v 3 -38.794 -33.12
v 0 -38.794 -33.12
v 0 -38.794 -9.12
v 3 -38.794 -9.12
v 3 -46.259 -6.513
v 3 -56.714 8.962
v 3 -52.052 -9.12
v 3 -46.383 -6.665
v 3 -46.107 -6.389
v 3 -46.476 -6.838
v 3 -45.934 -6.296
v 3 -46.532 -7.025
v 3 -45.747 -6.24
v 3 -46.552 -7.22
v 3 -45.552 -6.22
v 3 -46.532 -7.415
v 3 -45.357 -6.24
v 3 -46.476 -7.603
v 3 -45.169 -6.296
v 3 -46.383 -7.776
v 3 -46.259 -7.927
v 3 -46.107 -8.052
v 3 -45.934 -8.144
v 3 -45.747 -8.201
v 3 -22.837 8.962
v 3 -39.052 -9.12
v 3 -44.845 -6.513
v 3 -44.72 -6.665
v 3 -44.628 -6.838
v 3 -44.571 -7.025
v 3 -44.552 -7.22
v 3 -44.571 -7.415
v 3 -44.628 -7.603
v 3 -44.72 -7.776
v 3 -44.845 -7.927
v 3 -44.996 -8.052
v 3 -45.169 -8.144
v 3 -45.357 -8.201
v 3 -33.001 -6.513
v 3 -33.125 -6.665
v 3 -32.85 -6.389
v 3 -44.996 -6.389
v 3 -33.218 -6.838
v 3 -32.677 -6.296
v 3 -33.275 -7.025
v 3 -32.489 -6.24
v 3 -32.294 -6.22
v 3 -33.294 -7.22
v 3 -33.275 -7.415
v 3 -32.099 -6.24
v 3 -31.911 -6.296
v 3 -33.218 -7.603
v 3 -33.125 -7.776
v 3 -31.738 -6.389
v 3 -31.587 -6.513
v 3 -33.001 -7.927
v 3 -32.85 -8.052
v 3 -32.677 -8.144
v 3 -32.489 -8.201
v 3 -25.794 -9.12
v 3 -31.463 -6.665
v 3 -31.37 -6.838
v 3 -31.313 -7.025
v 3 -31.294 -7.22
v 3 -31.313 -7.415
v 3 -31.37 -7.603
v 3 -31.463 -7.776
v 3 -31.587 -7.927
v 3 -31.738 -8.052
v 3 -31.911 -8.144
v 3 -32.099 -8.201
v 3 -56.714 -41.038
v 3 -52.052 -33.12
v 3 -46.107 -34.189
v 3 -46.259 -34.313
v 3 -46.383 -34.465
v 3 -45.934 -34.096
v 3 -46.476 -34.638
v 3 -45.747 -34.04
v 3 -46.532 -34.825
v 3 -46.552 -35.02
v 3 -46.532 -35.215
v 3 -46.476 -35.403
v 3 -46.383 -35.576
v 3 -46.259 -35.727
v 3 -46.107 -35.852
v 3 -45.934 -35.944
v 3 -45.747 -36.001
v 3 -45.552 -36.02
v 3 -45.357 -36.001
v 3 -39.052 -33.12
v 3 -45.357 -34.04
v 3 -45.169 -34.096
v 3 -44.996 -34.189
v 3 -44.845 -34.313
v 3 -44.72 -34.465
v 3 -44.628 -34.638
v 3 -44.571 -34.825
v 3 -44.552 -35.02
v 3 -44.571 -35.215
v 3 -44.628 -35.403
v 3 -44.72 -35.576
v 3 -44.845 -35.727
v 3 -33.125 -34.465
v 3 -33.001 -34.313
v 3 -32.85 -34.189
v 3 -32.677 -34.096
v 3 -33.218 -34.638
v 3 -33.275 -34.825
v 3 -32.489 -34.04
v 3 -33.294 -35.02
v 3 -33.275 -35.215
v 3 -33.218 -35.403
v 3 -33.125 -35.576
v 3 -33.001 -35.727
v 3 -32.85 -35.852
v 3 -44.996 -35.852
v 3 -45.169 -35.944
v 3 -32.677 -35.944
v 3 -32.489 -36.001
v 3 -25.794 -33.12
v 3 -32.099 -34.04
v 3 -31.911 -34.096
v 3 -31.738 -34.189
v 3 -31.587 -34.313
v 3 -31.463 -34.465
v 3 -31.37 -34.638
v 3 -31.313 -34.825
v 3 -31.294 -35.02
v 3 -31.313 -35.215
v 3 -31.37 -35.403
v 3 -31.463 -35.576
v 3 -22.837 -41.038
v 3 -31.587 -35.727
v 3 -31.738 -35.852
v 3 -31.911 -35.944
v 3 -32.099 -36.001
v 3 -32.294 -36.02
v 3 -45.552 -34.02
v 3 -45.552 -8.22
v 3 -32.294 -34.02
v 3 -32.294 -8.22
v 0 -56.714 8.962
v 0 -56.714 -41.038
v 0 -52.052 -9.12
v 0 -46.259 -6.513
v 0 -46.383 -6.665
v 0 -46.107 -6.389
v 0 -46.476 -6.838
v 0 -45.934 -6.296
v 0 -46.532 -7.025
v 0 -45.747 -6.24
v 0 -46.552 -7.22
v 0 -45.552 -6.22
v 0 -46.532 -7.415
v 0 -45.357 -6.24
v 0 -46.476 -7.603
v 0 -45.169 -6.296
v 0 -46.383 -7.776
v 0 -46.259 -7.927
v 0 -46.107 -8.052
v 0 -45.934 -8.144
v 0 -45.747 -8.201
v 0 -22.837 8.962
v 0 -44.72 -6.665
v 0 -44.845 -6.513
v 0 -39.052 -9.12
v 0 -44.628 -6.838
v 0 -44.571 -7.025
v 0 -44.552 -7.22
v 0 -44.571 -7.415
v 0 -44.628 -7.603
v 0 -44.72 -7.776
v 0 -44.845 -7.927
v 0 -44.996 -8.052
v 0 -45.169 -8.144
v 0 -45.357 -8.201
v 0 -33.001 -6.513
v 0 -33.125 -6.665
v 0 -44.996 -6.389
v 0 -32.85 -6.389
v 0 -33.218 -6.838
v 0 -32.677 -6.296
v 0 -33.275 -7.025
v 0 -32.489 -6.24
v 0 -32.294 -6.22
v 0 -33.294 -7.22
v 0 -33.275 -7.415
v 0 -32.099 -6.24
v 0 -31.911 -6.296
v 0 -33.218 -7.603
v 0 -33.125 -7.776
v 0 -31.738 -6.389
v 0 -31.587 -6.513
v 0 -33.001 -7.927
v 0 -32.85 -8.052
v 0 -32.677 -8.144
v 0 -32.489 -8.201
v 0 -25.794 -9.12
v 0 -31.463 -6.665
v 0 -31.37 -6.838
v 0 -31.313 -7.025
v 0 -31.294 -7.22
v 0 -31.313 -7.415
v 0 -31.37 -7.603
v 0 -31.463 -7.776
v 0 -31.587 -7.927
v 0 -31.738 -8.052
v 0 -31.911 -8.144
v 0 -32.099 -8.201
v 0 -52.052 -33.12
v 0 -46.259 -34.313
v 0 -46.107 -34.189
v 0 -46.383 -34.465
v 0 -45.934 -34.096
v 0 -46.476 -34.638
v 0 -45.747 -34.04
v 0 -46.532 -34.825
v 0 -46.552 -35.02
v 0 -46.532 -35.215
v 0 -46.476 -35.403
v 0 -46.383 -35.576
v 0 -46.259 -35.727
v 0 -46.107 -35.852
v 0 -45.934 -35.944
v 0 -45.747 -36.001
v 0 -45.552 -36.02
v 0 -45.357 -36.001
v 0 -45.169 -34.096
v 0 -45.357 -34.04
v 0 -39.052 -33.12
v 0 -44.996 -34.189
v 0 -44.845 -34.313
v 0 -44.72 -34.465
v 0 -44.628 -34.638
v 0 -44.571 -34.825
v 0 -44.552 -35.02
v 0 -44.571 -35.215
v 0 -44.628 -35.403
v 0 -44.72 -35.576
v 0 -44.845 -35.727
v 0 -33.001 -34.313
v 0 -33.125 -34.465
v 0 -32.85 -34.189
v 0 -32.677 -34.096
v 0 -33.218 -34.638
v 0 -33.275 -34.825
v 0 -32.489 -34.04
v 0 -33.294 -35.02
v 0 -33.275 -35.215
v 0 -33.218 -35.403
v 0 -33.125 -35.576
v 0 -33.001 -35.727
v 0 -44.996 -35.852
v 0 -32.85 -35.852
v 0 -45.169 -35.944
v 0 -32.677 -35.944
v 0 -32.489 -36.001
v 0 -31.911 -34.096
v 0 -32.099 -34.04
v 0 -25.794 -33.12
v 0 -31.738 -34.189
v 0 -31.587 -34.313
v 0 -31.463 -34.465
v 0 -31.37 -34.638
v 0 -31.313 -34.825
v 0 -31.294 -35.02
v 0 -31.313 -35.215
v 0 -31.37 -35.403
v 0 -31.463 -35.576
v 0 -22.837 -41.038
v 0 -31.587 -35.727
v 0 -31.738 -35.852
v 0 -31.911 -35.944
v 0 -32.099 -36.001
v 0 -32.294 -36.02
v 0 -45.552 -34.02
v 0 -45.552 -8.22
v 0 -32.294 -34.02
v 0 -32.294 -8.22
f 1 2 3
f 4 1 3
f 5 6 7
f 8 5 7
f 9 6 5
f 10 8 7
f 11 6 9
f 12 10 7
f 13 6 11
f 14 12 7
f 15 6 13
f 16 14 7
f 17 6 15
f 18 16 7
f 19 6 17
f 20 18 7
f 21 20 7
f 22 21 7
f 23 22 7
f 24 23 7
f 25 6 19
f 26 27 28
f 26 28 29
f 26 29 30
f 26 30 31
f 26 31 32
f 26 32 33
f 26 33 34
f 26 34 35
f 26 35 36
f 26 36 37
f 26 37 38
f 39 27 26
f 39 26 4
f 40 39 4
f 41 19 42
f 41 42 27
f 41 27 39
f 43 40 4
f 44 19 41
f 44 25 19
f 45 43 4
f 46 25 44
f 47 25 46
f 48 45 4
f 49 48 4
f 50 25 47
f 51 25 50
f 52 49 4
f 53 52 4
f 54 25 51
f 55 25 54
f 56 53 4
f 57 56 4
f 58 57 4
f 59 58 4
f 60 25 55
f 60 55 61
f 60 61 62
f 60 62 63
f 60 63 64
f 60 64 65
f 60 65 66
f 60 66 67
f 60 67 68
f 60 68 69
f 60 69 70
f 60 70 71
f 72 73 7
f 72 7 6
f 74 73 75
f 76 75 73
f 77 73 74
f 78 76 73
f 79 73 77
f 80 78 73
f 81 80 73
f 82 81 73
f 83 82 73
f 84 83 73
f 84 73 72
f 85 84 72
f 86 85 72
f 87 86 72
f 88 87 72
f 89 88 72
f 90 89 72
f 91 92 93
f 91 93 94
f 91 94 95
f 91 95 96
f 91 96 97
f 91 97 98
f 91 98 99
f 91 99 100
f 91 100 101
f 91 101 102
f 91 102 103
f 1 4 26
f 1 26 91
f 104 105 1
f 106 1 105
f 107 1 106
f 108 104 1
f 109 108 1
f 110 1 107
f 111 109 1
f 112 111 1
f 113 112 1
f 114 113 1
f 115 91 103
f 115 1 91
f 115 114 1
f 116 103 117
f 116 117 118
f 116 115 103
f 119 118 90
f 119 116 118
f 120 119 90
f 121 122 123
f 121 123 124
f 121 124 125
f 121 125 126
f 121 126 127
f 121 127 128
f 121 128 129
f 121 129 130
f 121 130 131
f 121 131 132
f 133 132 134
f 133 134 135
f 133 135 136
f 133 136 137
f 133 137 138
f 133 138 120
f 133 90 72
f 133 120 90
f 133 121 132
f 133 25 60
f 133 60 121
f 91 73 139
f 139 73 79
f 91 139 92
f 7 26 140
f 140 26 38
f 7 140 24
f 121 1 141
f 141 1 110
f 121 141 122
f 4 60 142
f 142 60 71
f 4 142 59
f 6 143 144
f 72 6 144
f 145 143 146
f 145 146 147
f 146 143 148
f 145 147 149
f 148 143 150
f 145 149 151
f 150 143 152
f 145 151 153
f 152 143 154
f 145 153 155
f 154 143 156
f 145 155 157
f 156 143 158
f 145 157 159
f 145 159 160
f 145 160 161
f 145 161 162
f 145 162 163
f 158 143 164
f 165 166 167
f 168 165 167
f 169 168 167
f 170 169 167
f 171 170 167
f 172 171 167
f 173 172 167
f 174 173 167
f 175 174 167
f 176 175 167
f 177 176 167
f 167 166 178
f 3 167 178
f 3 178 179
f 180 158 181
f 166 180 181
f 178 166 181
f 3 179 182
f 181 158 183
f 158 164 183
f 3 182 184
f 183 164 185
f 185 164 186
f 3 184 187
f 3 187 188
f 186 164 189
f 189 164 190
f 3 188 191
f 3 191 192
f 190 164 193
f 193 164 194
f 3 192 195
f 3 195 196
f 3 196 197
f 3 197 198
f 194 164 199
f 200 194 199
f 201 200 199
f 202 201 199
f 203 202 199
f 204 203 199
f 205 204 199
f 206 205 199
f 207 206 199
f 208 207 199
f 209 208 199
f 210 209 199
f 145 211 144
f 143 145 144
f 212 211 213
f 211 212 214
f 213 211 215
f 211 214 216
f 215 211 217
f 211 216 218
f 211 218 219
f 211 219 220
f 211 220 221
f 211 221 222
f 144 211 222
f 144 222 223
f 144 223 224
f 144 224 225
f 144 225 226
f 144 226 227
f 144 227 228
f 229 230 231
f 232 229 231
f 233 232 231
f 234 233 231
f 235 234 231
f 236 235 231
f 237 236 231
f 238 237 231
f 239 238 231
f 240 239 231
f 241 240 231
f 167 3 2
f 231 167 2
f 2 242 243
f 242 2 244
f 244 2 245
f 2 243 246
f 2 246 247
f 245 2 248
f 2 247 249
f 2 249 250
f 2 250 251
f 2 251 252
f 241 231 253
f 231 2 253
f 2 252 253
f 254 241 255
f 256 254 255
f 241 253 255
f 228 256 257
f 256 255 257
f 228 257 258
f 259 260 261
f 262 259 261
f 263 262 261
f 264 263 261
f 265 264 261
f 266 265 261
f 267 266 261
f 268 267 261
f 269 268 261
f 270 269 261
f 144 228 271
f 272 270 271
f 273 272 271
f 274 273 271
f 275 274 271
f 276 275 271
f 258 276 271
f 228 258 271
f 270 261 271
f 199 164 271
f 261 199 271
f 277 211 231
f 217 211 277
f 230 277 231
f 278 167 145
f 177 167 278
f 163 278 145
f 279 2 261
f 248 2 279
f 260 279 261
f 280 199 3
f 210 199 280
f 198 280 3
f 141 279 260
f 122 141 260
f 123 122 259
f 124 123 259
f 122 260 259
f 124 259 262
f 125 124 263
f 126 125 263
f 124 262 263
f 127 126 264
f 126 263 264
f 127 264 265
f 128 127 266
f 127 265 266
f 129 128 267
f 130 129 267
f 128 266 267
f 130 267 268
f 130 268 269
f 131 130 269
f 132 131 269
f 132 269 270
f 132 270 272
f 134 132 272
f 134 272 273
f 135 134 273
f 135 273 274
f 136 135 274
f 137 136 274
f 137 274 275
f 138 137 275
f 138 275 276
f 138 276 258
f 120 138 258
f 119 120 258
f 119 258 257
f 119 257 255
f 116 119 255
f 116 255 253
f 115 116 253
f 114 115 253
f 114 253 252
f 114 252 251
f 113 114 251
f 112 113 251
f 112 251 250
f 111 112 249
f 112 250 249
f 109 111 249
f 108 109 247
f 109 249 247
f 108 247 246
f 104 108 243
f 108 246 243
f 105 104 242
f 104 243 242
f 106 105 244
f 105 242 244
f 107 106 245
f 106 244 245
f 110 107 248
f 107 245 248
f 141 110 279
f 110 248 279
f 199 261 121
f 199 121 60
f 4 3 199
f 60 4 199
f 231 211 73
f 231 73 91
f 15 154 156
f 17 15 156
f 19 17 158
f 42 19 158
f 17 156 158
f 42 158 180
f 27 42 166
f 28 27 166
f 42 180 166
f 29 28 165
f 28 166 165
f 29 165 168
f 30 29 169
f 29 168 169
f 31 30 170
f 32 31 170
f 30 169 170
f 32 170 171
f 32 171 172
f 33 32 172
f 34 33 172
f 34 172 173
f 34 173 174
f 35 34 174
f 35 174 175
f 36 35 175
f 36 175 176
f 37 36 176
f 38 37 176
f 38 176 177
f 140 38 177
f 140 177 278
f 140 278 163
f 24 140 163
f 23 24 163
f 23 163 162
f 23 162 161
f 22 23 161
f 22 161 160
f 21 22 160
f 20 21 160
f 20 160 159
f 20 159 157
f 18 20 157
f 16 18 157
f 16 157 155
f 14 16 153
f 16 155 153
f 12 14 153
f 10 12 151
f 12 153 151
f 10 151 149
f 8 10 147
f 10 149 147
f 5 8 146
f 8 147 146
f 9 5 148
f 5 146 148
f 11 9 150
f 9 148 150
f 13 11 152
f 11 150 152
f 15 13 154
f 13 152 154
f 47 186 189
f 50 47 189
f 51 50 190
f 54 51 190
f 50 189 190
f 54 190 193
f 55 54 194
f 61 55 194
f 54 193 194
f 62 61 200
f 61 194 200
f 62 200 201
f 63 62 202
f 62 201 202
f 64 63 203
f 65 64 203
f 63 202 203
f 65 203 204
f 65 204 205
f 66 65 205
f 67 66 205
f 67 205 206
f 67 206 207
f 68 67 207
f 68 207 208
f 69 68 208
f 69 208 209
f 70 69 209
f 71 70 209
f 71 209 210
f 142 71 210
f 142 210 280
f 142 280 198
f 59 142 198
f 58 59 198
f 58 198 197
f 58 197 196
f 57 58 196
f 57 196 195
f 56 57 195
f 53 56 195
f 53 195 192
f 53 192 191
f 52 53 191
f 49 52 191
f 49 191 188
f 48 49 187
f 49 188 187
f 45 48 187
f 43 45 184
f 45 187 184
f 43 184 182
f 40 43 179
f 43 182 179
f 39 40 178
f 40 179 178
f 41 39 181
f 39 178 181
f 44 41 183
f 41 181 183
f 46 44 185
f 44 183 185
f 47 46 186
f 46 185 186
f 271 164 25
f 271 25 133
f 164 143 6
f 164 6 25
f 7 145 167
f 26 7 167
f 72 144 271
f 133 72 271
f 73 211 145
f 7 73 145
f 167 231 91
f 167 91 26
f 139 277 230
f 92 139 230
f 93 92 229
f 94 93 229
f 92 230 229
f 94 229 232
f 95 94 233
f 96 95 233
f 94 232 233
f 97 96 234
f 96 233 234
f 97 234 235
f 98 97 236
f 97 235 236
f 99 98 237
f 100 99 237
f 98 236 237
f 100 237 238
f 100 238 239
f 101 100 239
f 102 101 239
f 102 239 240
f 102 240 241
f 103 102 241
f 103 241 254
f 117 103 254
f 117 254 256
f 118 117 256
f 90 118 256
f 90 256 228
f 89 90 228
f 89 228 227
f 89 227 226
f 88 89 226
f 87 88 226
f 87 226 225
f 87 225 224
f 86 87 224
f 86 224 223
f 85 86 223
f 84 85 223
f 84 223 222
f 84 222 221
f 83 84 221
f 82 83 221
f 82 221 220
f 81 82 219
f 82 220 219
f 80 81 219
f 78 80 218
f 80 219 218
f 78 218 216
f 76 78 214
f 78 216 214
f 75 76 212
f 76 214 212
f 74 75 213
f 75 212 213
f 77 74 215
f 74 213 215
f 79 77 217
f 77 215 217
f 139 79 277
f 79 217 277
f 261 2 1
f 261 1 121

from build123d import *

# Parameters (mm, degrees)
SKETCH1_W           = 50
SKETCH1_H           = 33.876964868
BOSS_EXTRUDE1_DEPTH = 3
SKETCH2_R           = 1
SKETCH2_W           = 24
SKETCH2_H           = 13
CUT_EXTRUDE1_DEPTH  = 4


with BuildPart() as part:
    # Sketch1 → Boss-Extrude1 (new body)
    with BuildSketch(Plane(origin=(0, 0, 0), x_dir=(0, 0, -1), z_dir=(1, 0, 0))):
        with Locations((16.038383019, -39.775181141)):
            Rectangle(SKETCH1_W, SKETCH1_H)
    extrude(amount=BOSS_EXTRUDE1_DEPTH)

    # Sketch2 → Cut-Extrude1 (cut, through all)
    with BuildSketch(Plane.ZY):
        with Locations((-35.020353647, -45.551677475)):
            Circle(SKETCH2_R)
        with Locations((-7.220353647, -45.551677475)):
            Circle(SKETCH2_R)
        with Locations((-35.020353647, -32.293971569)):
            Circle(SKETCH2_R)
        with Locations((-7.220353647, -32.293971569)):
            Circle(SKETCH2_R)
        with Locations((-21.120353647, -45.551677475)):
            Rectangle(SKETCH2_W, SKETCH2_H)
        with Locations((-21.120353647, -32.293971569)):
            Rectangle(SKETCH2_W, SKETCH2_H)
    extrude(amount=-CUT_EXTRUDE1_DEPTH, mode=Mode.SUBTRACT)


solid = part.part
